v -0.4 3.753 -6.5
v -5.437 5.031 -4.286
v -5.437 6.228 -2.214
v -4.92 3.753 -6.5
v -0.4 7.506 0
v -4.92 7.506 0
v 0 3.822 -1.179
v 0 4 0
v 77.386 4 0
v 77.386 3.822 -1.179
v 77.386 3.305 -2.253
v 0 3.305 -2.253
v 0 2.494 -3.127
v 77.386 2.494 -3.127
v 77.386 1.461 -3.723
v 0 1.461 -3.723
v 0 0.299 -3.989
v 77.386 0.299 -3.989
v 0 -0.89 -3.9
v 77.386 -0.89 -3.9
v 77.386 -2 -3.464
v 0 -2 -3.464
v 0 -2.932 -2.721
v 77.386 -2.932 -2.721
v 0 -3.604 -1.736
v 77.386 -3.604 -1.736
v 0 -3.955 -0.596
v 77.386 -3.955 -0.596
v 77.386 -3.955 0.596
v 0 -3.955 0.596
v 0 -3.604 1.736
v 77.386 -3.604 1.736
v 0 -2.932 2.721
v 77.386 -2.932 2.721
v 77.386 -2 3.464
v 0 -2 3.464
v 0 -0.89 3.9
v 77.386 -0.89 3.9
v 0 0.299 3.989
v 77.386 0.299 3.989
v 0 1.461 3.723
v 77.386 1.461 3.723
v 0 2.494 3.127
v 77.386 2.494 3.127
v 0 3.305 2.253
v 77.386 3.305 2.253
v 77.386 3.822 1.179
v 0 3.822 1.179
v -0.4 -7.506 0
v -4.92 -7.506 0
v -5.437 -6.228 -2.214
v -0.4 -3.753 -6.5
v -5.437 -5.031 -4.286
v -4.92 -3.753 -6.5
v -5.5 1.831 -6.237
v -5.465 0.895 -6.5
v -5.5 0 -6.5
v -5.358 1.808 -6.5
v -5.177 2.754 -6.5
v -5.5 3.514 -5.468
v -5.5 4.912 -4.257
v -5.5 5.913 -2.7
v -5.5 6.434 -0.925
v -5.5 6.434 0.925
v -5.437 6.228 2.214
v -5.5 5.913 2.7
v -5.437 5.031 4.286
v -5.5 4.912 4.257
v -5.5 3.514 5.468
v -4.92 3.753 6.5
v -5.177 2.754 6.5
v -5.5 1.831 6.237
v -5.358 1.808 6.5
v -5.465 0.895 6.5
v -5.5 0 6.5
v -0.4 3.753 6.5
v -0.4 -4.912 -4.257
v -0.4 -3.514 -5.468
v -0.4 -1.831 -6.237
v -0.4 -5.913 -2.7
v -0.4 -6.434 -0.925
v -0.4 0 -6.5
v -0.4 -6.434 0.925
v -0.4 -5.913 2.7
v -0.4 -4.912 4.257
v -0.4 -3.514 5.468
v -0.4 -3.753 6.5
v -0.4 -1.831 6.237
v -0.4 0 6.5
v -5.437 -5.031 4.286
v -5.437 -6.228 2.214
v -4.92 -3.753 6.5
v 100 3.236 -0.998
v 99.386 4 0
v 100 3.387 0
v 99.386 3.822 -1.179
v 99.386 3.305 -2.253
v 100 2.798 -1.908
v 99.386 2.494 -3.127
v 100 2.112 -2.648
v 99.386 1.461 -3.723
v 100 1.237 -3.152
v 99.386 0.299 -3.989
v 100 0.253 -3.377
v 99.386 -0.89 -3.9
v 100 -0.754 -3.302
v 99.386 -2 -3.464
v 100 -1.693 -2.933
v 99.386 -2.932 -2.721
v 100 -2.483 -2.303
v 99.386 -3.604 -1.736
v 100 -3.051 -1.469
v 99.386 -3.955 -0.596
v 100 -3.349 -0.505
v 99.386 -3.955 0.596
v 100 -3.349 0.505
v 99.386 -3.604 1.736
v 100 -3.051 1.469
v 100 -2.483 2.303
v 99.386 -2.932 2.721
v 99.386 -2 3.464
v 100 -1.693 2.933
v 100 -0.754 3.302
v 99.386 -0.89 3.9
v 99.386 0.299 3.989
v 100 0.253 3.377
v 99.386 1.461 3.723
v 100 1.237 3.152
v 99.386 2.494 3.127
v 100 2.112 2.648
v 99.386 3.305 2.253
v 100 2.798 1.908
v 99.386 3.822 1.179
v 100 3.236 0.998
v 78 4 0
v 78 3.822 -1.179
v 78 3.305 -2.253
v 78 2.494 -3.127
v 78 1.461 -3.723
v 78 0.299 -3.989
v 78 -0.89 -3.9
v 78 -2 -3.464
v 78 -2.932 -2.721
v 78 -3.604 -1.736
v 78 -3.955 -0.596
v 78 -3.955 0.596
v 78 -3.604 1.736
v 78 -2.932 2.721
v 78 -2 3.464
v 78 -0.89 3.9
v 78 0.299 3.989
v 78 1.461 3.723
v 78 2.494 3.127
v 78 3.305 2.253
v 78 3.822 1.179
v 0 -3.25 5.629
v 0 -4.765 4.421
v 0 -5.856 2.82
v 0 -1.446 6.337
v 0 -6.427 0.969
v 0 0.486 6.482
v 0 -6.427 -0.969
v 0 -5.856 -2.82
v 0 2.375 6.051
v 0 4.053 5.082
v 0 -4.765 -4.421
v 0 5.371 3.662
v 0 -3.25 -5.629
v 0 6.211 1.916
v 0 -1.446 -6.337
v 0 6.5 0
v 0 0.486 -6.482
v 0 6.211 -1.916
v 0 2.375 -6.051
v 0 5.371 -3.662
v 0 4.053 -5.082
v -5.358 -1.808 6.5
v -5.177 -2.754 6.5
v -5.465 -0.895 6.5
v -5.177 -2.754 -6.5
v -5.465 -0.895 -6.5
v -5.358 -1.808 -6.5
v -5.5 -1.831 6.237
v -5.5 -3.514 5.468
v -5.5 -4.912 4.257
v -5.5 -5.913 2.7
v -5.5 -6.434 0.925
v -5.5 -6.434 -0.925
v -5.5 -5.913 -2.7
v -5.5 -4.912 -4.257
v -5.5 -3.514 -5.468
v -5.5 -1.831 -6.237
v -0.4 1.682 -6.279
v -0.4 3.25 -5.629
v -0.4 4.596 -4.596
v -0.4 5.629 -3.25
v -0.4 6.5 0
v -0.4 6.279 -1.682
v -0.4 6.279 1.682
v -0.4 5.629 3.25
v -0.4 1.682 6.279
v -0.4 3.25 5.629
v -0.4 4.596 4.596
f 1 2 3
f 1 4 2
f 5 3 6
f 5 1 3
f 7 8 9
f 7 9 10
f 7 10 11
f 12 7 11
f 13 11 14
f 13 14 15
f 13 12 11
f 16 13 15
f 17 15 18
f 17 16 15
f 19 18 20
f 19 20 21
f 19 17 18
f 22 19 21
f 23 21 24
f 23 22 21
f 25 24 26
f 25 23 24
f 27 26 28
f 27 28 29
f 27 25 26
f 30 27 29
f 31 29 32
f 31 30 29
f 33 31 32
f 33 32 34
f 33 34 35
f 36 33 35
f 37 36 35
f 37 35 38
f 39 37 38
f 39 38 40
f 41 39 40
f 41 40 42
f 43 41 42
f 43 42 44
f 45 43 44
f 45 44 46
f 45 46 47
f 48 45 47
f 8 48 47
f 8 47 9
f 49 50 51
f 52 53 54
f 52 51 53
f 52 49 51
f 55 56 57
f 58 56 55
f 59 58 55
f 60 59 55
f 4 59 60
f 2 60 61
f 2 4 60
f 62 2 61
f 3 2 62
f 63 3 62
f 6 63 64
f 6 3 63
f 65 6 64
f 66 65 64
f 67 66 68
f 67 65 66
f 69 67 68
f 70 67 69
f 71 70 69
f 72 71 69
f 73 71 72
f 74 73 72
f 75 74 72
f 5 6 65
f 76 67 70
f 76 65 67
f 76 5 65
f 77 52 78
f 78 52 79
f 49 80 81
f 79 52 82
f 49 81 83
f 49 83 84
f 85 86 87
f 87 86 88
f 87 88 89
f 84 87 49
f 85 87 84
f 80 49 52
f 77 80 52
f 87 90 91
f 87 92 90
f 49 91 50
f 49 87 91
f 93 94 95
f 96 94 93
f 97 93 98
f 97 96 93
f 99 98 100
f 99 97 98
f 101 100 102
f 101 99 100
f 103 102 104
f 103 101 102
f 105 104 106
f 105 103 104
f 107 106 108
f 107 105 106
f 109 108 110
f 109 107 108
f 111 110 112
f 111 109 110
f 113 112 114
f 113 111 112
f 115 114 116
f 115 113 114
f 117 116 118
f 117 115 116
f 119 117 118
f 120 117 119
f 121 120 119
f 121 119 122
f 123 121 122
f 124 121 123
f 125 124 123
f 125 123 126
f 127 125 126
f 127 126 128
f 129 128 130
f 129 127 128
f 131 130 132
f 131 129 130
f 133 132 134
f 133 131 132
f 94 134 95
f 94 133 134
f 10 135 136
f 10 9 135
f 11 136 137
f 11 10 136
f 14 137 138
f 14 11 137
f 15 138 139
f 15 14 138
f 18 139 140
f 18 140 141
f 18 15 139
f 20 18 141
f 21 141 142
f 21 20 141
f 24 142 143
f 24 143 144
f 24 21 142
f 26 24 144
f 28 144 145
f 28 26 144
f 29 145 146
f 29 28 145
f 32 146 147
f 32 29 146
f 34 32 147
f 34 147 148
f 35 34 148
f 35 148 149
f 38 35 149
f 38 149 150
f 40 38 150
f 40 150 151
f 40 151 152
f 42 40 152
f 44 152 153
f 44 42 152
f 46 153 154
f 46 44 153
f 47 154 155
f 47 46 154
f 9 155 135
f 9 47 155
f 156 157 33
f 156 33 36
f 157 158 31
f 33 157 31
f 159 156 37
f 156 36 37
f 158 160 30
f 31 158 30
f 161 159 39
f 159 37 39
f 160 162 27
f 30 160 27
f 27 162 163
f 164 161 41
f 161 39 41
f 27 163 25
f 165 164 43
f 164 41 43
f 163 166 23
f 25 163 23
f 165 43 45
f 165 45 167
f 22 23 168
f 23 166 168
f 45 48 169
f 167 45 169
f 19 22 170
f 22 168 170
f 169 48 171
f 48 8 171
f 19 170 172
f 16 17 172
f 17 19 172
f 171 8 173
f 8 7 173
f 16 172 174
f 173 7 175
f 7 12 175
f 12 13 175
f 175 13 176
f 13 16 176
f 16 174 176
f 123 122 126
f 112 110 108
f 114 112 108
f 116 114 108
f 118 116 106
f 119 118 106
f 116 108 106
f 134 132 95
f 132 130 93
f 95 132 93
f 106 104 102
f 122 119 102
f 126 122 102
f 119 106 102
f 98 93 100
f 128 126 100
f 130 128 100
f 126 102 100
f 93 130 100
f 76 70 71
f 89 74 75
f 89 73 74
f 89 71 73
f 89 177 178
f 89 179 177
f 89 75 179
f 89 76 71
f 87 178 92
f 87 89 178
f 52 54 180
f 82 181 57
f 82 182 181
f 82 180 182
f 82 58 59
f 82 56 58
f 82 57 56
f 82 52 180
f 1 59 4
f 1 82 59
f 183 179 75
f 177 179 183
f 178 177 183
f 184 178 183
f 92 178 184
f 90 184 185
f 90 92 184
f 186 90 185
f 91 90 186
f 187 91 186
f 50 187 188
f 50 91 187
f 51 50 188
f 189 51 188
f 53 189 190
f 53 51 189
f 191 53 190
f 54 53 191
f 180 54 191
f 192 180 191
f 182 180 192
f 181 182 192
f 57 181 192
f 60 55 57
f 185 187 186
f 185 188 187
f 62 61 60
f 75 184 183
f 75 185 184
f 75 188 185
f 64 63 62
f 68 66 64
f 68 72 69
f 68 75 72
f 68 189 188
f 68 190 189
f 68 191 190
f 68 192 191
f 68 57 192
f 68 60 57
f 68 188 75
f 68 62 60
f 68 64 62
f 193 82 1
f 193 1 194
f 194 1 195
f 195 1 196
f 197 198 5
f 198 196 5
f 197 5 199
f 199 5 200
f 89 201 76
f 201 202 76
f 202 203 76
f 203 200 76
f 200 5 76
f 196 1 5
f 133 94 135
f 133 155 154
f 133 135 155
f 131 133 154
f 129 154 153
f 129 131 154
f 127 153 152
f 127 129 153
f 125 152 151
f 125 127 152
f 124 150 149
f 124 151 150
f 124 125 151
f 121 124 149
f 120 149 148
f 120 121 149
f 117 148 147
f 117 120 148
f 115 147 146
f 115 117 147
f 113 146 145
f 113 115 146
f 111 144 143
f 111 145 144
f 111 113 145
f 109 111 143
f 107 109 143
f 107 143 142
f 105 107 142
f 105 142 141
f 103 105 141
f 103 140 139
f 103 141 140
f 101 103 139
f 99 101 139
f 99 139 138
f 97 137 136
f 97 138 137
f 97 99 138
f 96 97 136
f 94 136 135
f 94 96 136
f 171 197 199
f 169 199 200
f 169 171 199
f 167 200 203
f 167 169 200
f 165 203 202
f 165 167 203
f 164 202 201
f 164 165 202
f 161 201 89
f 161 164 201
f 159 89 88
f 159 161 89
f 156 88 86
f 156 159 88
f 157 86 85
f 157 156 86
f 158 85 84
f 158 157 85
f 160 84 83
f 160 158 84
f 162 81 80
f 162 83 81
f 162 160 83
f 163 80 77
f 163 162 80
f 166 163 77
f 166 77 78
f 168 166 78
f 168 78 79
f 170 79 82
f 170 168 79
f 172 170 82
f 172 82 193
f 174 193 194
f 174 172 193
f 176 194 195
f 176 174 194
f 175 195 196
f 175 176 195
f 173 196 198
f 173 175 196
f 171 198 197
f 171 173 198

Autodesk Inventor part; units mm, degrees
ref_plane "YZ Plane" through (0, 0, 0) normal (1, 0, 0) x (0, 1, 0)
ref_plane "XZ Plane" through (0, 0, 0) normal (0, 1, 0) x (-1, 0, 0)
sketch "Sketch1" plane through (0, 0, 0) normal (0, 0, 1) x (1, 0, 0)
  line L0 (0, 6.5) -> (0, 4)
  line L1 (78, 4) -> (100, 4)
  line L2 (100, 4) -> (100, 0)
  line L3 (100, 0) -> (-0.4001, 0)
  line L4 (-20.4801, 0) -> (120.08, 0) projected
  line L5 (-0.4001, 0) -> (-0.4001, 6.5)
  line L6 (-0.4001, 6.5) -> (0, 6.5)
  line L7 (78, 4) -> (77.3864, 4)
  line L8 (77.3864, 4) -> (0, 4)
  line L9 (0, -1.3) -> (0, 7.8) projected
  dimension "d0" = 100
  dimension "d1" = 22
  dimension "d2" = 8
  dimension "d9" = 0.4001
  dimension "d10" = 13
  dimension "d13" = 0.6136
  dimension "d14" = 8
revolve "Body" add sketch "Sketch1" angle 360 about axis through (100, 0, 0) along (-1, 0, 0)
sketch "Sketch2" plane through (-0.4001, 0, 0) normal (-1, 0, 0) x (0, 0, 1)
  line L0 (0, 7.5056) -> (6.5, 3.7528)
  line L1 (6.5, 3.7528) -> (6.5, -3.7528)
  line L2 (6.5, -3.7528) -> (0, -7.5056)
  line L3 (0, -7.5056) -> (-6.5, -3.7528)
  line L4 (-6.5, -3.7528) -> (-6.5, 3.7528)
  line L5 (-6.5, 3.7528) -> (0, 7.5056)
  point P0 (0, 0)
  point P1 (0, 0)
  dimension "d11" = 13
extrude "Head" add sketch "Sketch2" along normal blind 5.1
sketch "Sketch4" plane through (0, 0, 0) normal (0, 0, 1) x (1, 0, 0)
  line L0 (-5.5001, 6.5) -> (-5.5001, 7.5056)
  line L1 (-5.5001, 7.5056) -> (-4.9195, 7.5056)
  line L2 (-4.9195, 7.5056) -> (-5.5001, 6.5)
  line L3 (-6.5201, 0) -> (0.6199, 0) projected
  line L4 (-0.4001, 7.5056) -> (-5.5001, 7.5056) projected
  line L5 (-5.5001, 3.7528) -> (-5.5001, 7.5056) projected
  dimension "d5" = 30
  dimension "d19" = 13
revolve "Chamfer1" cut sketch "Sketch4" angle 360 about axis through (-10, 0, 0) along (1, 0, 0)
thread "Thread" size "M8x1" class "6g" standard "ISO Metric profile" length 22
chamfer "Chamfer2" distance 0.6134 distance2 0.6136 1 edges at (100, -4, 0) measured on face at (100, -1.054, 1.6624)
ref_plane "Work Plane1" through (1.525, 0, 0) normal (0, 0, 1) x (1, 0, 0)
equation "\"d0\" = NLG"
equation "\"d1\" = GEL"
equation "\"d2\" = GD"
equation "\"d10\" = SD2"
equation "\"d14\" = BDM"
equation "\"d11\" = SW"
equation "\"d3\" = KOH - SD"
equation "\"d5\" = ANG1"
equation "\"d19\" = SW0"
equation "\"d15\" = GEL"
equation "\"d6\" = -0.5 * SPD + 0.5 * GD"
equation "\"NLG\" = 100"
equation "\"GD\" = NND"
equation "\"BDM\" = NND"
equation "\"KOH\" = 5.5"
equation "\"GEL\" = 22"
equation "\"SW\" = 13"
equation "\"SW0\" = SW"
equation "\"SPD\" = NND - 1.2269 * PTC"
equation "\"SD2\" = SW"
equation "\"SD\" = WFT"
equation "\"ANG1\" = 30deg"
equation "\"GAL\" = 0.61345 * PTC"
equation "\"GUL\" = 0.61345 * PTC"
equation "\"RR\" = 0.4"
equation "\"WFT\" = 0.4"
equation "\"GD1\" = THREADDIA - 1.2269 * PTC"
equation "\"THREADDIA\" = 8"
equation "\"SDH\" = SW"
equation "\"TOA\" = 30deg"
equation "\"PTC\" = 1"
equation "\"NND\" = 8"
equation "\"E0\" = 1.155 * SW"
properties part number "CNS 4320 - M8 x 100" material "Steel, Mild"
